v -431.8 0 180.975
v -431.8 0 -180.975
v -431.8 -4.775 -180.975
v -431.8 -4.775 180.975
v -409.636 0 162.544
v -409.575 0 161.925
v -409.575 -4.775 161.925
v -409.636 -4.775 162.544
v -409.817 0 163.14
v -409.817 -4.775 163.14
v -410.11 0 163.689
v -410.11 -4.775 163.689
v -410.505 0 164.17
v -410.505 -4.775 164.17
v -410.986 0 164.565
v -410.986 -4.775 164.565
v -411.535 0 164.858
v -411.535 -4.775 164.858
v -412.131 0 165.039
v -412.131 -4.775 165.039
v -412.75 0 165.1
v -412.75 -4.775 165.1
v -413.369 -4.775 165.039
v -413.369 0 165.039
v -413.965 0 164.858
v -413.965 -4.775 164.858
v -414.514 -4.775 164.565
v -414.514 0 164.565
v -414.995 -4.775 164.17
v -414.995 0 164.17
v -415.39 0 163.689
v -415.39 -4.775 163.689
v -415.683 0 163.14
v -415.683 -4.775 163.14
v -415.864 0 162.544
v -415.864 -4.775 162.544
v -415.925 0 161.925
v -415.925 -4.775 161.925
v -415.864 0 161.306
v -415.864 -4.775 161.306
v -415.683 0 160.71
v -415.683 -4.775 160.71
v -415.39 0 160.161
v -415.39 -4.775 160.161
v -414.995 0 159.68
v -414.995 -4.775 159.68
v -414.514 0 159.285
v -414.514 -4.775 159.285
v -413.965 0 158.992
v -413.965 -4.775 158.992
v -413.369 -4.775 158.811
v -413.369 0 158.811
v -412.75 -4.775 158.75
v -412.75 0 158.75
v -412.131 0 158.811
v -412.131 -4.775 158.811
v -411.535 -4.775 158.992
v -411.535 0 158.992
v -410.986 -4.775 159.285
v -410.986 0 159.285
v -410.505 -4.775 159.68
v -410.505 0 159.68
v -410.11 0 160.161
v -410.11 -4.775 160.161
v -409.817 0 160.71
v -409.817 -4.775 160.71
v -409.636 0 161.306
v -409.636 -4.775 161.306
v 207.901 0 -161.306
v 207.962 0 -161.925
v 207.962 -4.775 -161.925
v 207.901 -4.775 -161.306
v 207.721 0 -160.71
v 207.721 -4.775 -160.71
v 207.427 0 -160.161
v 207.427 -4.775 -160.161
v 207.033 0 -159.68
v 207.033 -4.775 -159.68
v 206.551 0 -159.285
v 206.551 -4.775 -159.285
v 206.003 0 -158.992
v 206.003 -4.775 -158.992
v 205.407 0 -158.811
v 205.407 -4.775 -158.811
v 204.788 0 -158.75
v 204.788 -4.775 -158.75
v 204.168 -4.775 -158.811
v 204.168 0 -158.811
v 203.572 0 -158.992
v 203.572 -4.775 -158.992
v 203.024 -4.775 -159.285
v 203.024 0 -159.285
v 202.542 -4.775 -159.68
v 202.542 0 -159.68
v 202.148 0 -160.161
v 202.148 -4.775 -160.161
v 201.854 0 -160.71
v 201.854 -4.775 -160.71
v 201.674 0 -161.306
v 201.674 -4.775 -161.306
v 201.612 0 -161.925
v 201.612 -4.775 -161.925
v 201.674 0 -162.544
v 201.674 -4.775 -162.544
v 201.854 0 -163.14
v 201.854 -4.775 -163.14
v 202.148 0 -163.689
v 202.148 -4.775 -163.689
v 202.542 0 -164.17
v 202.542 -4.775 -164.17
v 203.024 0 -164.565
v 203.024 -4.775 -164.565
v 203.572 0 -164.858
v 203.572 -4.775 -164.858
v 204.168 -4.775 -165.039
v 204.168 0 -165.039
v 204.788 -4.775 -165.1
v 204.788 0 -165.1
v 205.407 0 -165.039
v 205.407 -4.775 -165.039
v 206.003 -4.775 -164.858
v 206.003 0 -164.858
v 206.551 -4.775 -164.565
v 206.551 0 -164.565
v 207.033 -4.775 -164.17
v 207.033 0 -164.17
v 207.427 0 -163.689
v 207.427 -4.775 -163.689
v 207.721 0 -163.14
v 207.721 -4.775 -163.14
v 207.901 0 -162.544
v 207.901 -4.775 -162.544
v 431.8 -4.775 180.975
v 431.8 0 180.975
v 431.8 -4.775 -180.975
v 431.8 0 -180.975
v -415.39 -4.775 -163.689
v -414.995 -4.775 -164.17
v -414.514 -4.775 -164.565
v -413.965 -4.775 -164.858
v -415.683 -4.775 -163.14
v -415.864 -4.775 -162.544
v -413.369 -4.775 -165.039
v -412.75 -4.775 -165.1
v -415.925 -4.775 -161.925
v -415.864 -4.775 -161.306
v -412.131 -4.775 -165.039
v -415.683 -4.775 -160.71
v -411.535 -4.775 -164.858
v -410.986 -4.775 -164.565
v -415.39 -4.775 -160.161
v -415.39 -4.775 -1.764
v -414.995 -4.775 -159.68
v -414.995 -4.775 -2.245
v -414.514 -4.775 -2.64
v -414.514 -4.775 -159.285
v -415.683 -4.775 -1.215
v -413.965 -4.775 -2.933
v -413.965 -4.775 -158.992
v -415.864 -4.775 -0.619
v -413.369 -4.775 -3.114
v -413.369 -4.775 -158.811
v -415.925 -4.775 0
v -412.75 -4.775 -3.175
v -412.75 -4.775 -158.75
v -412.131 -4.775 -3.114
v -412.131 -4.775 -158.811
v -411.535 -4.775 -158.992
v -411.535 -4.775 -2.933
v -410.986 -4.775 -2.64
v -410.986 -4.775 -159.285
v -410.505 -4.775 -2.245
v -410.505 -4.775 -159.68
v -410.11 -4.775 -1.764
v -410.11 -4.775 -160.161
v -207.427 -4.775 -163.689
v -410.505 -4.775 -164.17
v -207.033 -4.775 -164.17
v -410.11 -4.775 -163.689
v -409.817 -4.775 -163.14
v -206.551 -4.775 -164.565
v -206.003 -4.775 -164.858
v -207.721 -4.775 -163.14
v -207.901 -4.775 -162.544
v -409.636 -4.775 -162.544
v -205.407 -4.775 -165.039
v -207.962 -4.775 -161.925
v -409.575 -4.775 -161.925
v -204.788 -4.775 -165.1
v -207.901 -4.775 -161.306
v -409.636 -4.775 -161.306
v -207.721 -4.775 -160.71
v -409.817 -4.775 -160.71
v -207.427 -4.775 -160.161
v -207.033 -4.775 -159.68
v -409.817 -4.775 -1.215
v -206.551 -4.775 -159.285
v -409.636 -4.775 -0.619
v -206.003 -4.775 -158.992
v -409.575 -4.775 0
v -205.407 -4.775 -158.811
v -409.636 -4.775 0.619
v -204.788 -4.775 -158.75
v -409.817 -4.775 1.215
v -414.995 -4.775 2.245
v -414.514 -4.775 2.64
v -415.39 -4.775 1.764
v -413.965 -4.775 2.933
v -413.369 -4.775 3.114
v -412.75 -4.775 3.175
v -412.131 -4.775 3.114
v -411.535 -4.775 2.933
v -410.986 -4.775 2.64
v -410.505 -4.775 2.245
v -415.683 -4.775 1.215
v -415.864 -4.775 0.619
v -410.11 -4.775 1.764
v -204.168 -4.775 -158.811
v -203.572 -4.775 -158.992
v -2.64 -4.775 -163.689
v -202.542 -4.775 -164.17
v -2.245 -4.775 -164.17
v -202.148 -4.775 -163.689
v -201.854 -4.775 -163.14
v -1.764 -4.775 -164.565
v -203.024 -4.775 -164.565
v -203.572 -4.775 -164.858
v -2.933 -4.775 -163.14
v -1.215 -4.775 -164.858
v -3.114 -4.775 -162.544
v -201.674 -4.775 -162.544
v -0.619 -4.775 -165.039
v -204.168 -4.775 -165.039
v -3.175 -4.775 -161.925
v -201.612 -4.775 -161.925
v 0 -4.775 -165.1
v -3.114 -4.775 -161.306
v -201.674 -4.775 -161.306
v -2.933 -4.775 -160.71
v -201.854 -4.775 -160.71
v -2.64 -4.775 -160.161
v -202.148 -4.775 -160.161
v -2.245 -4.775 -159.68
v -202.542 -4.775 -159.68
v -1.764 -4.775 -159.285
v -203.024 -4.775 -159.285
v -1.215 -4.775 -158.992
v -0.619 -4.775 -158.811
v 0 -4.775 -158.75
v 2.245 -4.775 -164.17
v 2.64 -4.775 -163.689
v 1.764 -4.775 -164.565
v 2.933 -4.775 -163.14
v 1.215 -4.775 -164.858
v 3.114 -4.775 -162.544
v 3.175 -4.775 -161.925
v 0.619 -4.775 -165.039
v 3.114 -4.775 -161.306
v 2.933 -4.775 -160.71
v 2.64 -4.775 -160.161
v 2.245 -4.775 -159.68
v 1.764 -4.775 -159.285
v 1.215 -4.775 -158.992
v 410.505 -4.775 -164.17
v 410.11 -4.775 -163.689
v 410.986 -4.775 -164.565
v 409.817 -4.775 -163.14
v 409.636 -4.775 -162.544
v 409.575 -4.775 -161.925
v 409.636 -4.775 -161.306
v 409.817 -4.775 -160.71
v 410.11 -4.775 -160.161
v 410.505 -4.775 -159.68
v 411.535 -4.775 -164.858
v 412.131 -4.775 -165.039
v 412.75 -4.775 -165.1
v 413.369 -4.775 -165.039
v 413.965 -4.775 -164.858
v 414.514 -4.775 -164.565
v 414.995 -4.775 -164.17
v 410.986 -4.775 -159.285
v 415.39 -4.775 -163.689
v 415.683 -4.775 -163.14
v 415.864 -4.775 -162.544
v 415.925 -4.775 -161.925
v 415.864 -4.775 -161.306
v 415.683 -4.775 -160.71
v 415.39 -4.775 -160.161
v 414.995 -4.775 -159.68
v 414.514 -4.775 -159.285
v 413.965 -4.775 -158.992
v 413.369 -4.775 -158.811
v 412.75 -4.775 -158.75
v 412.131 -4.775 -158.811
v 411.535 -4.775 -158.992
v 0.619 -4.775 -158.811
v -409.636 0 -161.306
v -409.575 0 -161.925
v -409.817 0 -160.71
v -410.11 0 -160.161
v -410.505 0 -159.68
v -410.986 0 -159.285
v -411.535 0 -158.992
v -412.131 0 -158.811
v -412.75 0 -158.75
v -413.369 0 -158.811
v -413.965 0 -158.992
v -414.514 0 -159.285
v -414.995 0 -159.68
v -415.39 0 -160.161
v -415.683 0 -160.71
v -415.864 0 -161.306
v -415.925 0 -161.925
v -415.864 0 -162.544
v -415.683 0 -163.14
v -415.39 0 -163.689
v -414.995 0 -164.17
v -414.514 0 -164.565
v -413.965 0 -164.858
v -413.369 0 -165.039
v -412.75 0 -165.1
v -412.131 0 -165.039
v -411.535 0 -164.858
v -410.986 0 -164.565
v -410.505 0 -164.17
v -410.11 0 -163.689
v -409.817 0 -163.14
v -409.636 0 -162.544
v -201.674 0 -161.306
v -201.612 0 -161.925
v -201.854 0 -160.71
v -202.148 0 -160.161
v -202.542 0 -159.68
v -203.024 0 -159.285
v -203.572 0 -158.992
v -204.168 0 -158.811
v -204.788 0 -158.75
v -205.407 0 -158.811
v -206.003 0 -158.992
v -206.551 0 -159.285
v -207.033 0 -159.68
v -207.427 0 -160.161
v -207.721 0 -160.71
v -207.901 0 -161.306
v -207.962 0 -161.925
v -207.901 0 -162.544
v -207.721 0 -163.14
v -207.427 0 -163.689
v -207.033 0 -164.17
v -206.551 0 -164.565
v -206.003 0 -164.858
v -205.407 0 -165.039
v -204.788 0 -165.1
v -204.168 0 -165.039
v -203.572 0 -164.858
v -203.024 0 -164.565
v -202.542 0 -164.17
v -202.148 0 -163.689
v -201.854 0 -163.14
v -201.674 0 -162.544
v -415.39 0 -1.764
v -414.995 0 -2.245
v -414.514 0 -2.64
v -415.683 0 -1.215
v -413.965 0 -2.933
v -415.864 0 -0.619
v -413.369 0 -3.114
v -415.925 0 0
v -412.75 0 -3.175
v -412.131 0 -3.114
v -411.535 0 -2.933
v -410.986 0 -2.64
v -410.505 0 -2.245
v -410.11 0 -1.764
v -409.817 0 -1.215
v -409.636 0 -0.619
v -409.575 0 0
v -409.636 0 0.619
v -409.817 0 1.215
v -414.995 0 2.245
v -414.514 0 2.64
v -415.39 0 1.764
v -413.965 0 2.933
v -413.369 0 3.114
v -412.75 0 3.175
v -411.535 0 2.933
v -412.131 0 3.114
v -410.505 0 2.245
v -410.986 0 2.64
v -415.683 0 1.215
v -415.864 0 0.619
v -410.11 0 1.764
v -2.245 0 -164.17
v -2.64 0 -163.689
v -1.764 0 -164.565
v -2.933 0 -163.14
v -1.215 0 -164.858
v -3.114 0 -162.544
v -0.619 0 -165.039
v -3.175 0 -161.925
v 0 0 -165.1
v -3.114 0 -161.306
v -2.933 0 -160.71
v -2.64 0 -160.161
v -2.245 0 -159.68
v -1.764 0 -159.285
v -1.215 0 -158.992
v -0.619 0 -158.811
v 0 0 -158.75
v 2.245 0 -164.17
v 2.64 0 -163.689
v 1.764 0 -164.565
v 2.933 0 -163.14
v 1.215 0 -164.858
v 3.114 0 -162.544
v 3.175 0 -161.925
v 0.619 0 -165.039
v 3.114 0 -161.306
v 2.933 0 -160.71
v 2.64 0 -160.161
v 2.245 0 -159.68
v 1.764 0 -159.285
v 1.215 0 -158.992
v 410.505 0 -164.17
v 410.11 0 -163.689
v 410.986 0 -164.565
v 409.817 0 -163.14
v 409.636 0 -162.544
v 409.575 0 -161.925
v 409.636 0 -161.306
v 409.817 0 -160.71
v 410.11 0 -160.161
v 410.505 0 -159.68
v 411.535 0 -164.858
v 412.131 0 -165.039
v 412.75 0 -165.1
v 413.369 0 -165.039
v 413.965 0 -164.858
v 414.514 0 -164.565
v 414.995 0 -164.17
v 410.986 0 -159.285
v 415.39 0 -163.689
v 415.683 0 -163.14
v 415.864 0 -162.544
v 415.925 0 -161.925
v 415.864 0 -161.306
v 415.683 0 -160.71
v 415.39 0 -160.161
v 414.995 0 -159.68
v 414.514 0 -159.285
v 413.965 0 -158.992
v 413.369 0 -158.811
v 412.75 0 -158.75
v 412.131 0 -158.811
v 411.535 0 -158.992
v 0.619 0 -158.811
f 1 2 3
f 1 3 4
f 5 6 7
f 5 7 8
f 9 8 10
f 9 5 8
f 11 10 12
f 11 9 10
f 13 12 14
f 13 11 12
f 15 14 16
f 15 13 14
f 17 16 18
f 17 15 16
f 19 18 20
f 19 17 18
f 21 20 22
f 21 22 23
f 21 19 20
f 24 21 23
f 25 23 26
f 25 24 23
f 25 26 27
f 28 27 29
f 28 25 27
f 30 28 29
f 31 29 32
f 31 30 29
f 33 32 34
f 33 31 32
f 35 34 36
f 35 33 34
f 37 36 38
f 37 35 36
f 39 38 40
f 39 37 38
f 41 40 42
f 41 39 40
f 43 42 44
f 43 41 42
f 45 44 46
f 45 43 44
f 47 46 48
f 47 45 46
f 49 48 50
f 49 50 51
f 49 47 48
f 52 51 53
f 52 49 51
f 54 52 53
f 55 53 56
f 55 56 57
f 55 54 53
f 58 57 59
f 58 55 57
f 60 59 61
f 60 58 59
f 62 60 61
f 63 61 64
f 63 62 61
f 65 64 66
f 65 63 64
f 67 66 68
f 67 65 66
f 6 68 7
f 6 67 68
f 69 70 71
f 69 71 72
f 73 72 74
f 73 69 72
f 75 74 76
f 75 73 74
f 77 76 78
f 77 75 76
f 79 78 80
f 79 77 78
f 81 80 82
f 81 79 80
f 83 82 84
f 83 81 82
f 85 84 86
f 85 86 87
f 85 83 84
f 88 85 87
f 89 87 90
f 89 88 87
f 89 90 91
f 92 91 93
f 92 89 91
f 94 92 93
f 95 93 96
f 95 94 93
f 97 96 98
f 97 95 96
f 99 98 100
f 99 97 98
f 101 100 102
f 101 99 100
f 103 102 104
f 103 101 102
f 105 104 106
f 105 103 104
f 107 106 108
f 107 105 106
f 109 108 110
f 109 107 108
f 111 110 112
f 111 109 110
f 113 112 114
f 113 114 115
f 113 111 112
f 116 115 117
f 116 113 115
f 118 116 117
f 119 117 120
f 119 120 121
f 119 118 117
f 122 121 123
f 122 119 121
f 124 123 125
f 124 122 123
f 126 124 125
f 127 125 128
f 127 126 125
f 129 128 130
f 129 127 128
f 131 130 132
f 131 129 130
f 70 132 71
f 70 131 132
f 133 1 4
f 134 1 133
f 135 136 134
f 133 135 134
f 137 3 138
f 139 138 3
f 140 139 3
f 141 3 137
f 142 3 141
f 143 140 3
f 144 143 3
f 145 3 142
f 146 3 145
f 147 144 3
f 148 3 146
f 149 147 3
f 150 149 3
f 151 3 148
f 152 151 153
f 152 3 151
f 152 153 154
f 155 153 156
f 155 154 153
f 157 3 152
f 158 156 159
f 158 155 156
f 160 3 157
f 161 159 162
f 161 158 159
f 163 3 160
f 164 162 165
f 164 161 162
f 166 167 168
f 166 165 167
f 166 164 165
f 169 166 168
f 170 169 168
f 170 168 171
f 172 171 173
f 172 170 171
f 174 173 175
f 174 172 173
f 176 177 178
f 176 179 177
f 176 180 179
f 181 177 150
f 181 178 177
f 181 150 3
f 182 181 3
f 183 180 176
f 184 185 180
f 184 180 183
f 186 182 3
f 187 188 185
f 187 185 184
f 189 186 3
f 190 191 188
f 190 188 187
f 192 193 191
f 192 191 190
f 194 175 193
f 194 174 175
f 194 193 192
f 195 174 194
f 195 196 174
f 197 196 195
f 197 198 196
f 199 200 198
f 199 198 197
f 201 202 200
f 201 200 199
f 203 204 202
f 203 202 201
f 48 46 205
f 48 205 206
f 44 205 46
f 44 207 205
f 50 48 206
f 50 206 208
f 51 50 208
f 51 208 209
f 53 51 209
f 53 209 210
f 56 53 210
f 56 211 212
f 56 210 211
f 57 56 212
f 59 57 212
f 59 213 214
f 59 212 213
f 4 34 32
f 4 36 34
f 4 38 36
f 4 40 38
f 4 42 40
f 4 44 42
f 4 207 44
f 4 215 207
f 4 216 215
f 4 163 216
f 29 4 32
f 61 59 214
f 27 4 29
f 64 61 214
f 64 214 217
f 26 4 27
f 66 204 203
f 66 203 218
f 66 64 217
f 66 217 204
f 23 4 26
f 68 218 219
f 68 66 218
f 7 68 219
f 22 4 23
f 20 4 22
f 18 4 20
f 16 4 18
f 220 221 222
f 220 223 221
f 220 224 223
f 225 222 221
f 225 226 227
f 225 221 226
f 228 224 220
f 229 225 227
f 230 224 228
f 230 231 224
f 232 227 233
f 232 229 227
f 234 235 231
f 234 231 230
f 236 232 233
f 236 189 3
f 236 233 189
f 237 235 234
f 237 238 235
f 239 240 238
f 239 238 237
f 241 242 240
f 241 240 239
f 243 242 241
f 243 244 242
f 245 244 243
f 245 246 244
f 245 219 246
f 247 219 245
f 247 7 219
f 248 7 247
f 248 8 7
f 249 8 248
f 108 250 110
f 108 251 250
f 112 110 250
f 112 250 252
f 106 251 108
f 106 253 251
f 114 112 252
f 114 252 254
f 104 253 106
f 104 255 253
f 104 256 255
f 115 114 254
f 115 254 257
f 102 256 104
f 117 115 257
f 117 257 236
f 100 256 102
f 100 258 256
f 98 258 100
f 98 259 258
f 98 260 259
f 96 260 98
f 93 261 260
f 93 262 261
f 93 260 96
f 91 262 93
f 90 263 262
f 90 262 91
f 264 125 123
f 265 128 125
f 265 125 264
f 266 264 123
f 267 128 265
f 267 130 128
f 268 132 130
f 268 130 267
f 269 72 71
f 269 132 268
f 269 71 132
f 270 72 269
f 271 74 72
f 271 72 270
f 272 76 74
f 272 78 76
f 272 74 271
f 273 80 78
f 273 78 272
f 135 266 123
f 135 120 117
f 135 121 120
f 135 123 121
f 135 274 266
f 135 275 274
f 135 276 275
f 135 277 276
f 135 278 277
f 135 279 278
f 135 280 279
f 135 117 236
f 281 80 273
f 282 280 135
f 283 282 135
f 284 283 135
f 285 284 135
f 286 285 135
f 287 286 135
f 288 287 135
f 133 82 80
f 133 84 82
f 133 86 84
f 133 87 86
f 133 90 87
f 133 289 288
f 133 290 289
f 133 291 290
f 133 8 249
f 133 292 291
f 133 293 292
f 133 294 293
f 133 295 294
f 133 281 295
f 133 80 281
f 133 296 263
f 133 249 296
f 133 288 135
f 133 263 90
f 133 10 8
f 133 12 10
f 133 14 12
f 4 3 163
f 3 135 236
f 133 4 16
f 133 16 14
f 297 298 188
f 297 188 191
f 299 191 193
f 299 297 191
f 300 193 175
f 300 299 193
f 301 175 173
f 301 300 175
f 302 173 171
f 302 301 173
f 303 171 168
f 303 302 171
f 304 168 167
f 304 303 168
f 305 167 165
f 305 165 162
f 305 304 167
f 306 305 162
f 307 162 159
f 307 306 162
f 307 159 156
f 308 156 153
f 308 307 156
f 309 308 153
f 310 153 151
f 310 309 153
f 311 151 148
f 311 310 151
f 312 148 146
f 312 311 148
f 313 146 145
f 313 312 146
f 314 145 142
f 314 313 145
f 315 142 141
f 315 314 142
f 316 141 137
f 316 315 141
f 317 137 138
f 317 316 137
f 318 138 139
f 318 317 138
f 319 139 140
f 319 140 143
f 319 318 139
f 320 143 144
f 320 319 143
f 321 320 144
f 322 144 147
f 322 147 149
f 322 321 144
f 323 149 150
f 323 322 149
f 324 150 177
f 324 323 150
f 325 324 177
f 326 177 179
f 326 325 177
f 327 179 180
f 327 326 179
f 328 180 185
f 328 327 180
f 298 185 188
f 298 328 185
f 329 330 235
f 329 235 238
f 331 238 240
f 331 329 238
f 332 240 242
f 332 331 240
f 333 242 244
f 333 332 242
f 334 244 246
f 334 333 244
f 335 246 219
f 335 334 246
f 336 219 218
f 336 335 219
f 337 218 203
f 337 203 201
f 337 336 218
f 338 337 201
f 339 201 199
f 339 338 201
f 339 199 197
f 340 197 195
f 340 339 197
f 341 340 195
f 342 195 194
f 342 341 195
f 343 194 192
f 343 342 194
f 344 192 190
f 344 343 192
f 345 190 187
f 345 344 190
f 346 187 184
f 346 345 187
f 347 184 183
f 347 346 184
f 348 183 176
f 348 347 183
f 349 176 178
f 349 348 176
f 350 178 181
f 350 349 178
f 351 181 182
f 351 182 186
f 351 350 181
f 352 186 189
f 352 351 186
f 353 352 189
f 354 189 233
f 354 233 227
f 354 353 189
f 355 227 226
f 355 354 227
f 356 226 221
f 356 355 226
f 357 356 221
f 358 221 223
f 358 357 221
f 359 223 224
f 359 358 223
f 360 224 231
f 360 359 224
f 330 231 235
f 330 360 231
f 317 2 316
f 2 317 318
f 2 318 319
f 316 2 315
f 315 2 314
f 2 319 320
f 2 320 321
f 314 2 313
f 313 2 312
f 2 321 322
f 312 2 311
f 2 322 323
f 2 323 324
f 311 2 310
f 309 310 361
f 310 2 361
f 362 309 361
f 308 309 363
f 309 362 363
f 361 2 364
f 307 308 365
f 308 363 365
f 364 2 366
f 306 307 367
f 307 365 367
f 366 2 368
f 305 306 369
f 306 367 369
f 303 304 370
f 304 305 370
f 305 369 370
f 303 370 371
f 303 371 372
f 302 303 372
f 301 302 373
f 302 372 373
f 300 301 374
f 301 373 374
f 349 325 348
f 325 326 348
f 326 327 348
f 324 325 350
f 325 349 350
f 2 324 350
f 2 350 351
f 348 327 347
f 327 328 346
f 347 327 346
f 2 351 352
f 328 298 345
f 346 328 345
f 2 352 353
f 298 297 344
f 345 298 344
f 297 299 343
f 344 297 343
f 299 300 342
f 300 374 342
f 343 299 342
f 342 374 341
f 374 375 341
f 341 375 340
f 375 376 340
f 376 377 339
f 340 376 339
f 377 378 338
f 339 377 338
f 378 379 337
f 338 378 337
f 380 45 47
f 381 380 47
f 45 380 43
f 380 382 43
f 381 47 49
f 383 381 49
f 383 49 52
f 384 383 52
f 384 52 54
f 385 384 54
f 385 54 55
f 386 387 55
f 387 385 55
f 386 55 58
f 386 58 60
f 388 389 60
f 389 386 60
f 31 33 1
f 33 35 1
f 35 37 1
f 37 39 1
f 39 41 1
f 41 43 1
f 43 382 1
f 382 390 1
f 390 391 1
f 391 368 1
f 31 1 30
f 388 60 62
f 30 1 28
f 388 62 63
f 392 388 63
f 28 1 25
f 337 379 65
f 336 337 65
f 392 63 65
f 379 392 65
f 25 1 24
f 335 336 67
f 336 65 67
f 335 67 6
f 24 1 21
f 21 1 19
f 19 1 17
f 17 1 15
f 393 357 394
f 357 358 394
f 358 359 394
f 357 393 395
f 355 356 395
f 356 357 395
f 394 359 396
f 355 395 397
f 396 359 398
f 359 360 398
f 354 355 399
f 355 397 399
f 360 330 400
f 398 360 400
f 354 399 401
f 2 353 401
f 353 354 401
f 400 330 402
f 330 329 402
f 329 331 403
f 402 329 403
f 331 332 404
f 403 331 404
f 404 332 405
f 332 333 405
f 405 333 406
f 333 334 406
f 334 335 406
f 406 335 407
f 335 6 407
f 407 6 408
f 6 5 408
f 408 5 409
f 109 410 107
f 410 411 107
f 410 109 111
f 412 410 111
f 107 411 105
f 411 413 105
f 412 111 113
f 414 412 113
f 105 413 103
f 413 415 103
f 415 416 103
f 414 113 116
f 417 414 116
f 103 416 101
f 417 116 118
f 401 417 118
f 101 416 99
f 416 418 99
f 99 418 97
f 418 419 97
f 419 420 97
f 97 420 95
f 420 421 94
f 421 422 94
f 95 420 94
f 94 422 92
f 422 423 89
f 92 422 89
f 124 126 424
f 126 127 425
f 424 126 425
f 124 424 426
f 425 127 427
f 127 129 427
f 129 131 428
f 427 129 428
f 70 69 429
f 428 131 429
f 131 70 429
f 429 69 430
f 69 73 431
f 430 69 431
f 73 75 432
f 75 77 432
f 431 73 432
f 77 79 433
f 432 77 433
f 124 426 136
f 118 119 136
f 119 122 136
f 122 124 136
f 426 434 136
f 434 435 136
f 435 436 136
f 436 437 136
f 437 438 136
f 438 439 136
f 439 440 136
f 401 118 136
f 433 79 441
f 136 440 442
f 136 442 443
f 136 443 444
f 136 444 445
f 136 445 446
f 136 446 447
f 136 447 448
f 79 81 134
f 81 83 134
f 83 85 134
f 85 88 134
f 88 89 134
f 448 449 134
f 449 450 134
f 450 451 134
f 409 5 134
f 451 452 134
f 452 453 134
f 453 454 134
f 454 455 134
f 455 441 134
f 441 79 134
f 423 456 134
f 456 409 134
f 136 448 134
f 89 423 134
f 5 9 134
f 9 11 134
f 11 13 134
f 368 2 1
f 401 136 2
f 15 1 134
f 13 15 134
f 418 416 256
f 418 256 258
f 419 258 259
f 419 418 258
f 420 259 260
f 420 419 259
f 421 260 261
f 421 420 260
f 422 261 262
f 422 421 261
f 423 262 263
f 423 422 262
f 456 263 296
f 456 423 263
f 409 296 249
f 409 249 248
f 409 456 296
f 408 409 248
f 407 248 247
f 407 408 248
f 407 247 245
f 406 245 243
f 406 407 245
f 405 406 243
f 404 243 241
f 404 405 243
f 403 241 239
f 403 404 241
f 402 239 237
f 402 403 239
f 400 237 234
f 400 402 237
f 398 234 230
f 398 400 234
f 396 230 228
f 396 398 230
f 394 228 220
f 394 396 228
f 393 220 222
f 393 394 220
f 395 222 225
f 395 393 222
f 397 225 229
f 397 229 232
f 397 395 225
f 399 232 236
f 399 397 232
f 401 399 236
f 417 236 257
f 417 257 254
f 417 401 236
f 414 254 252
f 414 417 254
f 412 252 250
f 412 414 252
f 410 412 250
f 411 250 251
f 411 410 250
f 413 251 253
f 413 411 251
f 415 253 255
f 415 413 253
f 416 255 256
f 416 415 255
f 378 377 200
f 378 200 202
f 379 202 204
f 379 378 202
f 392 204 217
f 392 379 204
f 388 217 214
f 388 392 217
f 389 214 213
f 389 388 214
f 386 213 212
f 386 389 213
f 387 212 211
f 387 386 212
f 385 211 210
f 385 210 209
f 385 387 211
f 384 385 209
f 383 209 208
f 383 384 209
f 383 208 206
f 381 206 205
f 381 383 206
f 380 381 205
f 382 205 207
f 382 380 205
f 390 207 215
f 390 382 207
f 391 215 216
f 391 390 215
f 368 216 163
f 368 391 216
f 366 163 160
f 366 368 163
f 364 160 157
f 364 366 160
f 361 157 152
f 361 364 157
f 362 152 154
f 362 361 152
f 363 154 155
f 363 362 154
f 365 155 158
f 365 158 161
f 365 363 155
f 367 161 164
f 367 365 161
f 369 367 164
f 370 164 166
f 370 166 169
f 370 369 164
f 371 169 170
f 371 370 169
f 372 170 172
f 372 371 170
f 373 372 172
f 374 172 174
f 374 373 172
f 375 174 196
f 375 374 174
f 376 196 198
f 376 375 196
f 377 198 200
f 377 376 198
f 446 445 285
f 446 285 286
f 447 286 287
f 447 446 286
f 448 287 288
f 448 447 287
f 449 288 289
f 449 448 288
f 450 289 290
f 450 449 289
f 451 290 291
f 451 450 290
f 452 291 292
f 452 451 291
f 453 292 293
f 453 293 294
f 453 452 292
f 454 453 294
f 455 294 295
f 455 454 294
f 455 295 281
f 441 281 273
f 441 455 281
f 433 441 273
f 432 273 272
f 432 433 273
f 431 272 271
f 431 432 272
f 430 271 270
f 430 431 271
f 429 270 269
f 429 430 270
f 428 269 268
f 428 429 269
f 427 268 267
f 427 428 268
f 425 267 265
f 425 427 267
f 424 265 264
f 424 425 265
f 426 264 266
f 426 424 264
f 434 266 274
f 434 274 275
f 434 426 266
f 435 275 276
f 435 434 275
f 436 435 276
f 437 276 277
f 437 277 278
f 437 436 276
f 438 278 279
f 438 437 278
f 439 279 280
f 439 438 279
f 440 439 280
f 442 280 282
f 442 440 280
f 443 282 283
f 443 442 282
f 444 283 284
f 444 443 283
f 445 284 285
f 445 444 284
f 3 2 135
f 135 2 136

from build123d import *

# Parameters (mm, degrees)
F0_W     = 863.6
F0_H     = 361.95
F0_R     = 3.175
F1_DEPTH = 4.7752


with BuildPart() as f1:
    # F0 (on Front) → F1 (new body)
    with BuildSketch(Plane.XZ):
        Rectangle(F0_W, F0_H)
        with Locations((-412.75, -161.925)):
            Circle(F0_R, mode=Mode.SUBTRACT)
        with Locations((-204.7875, -161.925)):
            Circle(F0_R, mode=Mode.SUBTRACT)
        with Locations((0, -161.925)):
            Circle(F0_R, mode=Mode.SUBTRACT)
        with Locations((204.7875, -161.925)):
            Circle(F0_R, mode=Mode.SUBTRACT)
        with Locations((412.75, -161.925)):
            Circle(F0_R, mode=Mode.SUBTRACT)
        with Locations((-412.75, 0)):
            Circle(F0_R, mode=Mode.SUBTRACT)
        with Locations((-412.75, 161.925)):
            Circle(F0_R, mode=Mode.SUBTRACT)
    extrude(amount=F1_DEPTH)


solid = f1.part
